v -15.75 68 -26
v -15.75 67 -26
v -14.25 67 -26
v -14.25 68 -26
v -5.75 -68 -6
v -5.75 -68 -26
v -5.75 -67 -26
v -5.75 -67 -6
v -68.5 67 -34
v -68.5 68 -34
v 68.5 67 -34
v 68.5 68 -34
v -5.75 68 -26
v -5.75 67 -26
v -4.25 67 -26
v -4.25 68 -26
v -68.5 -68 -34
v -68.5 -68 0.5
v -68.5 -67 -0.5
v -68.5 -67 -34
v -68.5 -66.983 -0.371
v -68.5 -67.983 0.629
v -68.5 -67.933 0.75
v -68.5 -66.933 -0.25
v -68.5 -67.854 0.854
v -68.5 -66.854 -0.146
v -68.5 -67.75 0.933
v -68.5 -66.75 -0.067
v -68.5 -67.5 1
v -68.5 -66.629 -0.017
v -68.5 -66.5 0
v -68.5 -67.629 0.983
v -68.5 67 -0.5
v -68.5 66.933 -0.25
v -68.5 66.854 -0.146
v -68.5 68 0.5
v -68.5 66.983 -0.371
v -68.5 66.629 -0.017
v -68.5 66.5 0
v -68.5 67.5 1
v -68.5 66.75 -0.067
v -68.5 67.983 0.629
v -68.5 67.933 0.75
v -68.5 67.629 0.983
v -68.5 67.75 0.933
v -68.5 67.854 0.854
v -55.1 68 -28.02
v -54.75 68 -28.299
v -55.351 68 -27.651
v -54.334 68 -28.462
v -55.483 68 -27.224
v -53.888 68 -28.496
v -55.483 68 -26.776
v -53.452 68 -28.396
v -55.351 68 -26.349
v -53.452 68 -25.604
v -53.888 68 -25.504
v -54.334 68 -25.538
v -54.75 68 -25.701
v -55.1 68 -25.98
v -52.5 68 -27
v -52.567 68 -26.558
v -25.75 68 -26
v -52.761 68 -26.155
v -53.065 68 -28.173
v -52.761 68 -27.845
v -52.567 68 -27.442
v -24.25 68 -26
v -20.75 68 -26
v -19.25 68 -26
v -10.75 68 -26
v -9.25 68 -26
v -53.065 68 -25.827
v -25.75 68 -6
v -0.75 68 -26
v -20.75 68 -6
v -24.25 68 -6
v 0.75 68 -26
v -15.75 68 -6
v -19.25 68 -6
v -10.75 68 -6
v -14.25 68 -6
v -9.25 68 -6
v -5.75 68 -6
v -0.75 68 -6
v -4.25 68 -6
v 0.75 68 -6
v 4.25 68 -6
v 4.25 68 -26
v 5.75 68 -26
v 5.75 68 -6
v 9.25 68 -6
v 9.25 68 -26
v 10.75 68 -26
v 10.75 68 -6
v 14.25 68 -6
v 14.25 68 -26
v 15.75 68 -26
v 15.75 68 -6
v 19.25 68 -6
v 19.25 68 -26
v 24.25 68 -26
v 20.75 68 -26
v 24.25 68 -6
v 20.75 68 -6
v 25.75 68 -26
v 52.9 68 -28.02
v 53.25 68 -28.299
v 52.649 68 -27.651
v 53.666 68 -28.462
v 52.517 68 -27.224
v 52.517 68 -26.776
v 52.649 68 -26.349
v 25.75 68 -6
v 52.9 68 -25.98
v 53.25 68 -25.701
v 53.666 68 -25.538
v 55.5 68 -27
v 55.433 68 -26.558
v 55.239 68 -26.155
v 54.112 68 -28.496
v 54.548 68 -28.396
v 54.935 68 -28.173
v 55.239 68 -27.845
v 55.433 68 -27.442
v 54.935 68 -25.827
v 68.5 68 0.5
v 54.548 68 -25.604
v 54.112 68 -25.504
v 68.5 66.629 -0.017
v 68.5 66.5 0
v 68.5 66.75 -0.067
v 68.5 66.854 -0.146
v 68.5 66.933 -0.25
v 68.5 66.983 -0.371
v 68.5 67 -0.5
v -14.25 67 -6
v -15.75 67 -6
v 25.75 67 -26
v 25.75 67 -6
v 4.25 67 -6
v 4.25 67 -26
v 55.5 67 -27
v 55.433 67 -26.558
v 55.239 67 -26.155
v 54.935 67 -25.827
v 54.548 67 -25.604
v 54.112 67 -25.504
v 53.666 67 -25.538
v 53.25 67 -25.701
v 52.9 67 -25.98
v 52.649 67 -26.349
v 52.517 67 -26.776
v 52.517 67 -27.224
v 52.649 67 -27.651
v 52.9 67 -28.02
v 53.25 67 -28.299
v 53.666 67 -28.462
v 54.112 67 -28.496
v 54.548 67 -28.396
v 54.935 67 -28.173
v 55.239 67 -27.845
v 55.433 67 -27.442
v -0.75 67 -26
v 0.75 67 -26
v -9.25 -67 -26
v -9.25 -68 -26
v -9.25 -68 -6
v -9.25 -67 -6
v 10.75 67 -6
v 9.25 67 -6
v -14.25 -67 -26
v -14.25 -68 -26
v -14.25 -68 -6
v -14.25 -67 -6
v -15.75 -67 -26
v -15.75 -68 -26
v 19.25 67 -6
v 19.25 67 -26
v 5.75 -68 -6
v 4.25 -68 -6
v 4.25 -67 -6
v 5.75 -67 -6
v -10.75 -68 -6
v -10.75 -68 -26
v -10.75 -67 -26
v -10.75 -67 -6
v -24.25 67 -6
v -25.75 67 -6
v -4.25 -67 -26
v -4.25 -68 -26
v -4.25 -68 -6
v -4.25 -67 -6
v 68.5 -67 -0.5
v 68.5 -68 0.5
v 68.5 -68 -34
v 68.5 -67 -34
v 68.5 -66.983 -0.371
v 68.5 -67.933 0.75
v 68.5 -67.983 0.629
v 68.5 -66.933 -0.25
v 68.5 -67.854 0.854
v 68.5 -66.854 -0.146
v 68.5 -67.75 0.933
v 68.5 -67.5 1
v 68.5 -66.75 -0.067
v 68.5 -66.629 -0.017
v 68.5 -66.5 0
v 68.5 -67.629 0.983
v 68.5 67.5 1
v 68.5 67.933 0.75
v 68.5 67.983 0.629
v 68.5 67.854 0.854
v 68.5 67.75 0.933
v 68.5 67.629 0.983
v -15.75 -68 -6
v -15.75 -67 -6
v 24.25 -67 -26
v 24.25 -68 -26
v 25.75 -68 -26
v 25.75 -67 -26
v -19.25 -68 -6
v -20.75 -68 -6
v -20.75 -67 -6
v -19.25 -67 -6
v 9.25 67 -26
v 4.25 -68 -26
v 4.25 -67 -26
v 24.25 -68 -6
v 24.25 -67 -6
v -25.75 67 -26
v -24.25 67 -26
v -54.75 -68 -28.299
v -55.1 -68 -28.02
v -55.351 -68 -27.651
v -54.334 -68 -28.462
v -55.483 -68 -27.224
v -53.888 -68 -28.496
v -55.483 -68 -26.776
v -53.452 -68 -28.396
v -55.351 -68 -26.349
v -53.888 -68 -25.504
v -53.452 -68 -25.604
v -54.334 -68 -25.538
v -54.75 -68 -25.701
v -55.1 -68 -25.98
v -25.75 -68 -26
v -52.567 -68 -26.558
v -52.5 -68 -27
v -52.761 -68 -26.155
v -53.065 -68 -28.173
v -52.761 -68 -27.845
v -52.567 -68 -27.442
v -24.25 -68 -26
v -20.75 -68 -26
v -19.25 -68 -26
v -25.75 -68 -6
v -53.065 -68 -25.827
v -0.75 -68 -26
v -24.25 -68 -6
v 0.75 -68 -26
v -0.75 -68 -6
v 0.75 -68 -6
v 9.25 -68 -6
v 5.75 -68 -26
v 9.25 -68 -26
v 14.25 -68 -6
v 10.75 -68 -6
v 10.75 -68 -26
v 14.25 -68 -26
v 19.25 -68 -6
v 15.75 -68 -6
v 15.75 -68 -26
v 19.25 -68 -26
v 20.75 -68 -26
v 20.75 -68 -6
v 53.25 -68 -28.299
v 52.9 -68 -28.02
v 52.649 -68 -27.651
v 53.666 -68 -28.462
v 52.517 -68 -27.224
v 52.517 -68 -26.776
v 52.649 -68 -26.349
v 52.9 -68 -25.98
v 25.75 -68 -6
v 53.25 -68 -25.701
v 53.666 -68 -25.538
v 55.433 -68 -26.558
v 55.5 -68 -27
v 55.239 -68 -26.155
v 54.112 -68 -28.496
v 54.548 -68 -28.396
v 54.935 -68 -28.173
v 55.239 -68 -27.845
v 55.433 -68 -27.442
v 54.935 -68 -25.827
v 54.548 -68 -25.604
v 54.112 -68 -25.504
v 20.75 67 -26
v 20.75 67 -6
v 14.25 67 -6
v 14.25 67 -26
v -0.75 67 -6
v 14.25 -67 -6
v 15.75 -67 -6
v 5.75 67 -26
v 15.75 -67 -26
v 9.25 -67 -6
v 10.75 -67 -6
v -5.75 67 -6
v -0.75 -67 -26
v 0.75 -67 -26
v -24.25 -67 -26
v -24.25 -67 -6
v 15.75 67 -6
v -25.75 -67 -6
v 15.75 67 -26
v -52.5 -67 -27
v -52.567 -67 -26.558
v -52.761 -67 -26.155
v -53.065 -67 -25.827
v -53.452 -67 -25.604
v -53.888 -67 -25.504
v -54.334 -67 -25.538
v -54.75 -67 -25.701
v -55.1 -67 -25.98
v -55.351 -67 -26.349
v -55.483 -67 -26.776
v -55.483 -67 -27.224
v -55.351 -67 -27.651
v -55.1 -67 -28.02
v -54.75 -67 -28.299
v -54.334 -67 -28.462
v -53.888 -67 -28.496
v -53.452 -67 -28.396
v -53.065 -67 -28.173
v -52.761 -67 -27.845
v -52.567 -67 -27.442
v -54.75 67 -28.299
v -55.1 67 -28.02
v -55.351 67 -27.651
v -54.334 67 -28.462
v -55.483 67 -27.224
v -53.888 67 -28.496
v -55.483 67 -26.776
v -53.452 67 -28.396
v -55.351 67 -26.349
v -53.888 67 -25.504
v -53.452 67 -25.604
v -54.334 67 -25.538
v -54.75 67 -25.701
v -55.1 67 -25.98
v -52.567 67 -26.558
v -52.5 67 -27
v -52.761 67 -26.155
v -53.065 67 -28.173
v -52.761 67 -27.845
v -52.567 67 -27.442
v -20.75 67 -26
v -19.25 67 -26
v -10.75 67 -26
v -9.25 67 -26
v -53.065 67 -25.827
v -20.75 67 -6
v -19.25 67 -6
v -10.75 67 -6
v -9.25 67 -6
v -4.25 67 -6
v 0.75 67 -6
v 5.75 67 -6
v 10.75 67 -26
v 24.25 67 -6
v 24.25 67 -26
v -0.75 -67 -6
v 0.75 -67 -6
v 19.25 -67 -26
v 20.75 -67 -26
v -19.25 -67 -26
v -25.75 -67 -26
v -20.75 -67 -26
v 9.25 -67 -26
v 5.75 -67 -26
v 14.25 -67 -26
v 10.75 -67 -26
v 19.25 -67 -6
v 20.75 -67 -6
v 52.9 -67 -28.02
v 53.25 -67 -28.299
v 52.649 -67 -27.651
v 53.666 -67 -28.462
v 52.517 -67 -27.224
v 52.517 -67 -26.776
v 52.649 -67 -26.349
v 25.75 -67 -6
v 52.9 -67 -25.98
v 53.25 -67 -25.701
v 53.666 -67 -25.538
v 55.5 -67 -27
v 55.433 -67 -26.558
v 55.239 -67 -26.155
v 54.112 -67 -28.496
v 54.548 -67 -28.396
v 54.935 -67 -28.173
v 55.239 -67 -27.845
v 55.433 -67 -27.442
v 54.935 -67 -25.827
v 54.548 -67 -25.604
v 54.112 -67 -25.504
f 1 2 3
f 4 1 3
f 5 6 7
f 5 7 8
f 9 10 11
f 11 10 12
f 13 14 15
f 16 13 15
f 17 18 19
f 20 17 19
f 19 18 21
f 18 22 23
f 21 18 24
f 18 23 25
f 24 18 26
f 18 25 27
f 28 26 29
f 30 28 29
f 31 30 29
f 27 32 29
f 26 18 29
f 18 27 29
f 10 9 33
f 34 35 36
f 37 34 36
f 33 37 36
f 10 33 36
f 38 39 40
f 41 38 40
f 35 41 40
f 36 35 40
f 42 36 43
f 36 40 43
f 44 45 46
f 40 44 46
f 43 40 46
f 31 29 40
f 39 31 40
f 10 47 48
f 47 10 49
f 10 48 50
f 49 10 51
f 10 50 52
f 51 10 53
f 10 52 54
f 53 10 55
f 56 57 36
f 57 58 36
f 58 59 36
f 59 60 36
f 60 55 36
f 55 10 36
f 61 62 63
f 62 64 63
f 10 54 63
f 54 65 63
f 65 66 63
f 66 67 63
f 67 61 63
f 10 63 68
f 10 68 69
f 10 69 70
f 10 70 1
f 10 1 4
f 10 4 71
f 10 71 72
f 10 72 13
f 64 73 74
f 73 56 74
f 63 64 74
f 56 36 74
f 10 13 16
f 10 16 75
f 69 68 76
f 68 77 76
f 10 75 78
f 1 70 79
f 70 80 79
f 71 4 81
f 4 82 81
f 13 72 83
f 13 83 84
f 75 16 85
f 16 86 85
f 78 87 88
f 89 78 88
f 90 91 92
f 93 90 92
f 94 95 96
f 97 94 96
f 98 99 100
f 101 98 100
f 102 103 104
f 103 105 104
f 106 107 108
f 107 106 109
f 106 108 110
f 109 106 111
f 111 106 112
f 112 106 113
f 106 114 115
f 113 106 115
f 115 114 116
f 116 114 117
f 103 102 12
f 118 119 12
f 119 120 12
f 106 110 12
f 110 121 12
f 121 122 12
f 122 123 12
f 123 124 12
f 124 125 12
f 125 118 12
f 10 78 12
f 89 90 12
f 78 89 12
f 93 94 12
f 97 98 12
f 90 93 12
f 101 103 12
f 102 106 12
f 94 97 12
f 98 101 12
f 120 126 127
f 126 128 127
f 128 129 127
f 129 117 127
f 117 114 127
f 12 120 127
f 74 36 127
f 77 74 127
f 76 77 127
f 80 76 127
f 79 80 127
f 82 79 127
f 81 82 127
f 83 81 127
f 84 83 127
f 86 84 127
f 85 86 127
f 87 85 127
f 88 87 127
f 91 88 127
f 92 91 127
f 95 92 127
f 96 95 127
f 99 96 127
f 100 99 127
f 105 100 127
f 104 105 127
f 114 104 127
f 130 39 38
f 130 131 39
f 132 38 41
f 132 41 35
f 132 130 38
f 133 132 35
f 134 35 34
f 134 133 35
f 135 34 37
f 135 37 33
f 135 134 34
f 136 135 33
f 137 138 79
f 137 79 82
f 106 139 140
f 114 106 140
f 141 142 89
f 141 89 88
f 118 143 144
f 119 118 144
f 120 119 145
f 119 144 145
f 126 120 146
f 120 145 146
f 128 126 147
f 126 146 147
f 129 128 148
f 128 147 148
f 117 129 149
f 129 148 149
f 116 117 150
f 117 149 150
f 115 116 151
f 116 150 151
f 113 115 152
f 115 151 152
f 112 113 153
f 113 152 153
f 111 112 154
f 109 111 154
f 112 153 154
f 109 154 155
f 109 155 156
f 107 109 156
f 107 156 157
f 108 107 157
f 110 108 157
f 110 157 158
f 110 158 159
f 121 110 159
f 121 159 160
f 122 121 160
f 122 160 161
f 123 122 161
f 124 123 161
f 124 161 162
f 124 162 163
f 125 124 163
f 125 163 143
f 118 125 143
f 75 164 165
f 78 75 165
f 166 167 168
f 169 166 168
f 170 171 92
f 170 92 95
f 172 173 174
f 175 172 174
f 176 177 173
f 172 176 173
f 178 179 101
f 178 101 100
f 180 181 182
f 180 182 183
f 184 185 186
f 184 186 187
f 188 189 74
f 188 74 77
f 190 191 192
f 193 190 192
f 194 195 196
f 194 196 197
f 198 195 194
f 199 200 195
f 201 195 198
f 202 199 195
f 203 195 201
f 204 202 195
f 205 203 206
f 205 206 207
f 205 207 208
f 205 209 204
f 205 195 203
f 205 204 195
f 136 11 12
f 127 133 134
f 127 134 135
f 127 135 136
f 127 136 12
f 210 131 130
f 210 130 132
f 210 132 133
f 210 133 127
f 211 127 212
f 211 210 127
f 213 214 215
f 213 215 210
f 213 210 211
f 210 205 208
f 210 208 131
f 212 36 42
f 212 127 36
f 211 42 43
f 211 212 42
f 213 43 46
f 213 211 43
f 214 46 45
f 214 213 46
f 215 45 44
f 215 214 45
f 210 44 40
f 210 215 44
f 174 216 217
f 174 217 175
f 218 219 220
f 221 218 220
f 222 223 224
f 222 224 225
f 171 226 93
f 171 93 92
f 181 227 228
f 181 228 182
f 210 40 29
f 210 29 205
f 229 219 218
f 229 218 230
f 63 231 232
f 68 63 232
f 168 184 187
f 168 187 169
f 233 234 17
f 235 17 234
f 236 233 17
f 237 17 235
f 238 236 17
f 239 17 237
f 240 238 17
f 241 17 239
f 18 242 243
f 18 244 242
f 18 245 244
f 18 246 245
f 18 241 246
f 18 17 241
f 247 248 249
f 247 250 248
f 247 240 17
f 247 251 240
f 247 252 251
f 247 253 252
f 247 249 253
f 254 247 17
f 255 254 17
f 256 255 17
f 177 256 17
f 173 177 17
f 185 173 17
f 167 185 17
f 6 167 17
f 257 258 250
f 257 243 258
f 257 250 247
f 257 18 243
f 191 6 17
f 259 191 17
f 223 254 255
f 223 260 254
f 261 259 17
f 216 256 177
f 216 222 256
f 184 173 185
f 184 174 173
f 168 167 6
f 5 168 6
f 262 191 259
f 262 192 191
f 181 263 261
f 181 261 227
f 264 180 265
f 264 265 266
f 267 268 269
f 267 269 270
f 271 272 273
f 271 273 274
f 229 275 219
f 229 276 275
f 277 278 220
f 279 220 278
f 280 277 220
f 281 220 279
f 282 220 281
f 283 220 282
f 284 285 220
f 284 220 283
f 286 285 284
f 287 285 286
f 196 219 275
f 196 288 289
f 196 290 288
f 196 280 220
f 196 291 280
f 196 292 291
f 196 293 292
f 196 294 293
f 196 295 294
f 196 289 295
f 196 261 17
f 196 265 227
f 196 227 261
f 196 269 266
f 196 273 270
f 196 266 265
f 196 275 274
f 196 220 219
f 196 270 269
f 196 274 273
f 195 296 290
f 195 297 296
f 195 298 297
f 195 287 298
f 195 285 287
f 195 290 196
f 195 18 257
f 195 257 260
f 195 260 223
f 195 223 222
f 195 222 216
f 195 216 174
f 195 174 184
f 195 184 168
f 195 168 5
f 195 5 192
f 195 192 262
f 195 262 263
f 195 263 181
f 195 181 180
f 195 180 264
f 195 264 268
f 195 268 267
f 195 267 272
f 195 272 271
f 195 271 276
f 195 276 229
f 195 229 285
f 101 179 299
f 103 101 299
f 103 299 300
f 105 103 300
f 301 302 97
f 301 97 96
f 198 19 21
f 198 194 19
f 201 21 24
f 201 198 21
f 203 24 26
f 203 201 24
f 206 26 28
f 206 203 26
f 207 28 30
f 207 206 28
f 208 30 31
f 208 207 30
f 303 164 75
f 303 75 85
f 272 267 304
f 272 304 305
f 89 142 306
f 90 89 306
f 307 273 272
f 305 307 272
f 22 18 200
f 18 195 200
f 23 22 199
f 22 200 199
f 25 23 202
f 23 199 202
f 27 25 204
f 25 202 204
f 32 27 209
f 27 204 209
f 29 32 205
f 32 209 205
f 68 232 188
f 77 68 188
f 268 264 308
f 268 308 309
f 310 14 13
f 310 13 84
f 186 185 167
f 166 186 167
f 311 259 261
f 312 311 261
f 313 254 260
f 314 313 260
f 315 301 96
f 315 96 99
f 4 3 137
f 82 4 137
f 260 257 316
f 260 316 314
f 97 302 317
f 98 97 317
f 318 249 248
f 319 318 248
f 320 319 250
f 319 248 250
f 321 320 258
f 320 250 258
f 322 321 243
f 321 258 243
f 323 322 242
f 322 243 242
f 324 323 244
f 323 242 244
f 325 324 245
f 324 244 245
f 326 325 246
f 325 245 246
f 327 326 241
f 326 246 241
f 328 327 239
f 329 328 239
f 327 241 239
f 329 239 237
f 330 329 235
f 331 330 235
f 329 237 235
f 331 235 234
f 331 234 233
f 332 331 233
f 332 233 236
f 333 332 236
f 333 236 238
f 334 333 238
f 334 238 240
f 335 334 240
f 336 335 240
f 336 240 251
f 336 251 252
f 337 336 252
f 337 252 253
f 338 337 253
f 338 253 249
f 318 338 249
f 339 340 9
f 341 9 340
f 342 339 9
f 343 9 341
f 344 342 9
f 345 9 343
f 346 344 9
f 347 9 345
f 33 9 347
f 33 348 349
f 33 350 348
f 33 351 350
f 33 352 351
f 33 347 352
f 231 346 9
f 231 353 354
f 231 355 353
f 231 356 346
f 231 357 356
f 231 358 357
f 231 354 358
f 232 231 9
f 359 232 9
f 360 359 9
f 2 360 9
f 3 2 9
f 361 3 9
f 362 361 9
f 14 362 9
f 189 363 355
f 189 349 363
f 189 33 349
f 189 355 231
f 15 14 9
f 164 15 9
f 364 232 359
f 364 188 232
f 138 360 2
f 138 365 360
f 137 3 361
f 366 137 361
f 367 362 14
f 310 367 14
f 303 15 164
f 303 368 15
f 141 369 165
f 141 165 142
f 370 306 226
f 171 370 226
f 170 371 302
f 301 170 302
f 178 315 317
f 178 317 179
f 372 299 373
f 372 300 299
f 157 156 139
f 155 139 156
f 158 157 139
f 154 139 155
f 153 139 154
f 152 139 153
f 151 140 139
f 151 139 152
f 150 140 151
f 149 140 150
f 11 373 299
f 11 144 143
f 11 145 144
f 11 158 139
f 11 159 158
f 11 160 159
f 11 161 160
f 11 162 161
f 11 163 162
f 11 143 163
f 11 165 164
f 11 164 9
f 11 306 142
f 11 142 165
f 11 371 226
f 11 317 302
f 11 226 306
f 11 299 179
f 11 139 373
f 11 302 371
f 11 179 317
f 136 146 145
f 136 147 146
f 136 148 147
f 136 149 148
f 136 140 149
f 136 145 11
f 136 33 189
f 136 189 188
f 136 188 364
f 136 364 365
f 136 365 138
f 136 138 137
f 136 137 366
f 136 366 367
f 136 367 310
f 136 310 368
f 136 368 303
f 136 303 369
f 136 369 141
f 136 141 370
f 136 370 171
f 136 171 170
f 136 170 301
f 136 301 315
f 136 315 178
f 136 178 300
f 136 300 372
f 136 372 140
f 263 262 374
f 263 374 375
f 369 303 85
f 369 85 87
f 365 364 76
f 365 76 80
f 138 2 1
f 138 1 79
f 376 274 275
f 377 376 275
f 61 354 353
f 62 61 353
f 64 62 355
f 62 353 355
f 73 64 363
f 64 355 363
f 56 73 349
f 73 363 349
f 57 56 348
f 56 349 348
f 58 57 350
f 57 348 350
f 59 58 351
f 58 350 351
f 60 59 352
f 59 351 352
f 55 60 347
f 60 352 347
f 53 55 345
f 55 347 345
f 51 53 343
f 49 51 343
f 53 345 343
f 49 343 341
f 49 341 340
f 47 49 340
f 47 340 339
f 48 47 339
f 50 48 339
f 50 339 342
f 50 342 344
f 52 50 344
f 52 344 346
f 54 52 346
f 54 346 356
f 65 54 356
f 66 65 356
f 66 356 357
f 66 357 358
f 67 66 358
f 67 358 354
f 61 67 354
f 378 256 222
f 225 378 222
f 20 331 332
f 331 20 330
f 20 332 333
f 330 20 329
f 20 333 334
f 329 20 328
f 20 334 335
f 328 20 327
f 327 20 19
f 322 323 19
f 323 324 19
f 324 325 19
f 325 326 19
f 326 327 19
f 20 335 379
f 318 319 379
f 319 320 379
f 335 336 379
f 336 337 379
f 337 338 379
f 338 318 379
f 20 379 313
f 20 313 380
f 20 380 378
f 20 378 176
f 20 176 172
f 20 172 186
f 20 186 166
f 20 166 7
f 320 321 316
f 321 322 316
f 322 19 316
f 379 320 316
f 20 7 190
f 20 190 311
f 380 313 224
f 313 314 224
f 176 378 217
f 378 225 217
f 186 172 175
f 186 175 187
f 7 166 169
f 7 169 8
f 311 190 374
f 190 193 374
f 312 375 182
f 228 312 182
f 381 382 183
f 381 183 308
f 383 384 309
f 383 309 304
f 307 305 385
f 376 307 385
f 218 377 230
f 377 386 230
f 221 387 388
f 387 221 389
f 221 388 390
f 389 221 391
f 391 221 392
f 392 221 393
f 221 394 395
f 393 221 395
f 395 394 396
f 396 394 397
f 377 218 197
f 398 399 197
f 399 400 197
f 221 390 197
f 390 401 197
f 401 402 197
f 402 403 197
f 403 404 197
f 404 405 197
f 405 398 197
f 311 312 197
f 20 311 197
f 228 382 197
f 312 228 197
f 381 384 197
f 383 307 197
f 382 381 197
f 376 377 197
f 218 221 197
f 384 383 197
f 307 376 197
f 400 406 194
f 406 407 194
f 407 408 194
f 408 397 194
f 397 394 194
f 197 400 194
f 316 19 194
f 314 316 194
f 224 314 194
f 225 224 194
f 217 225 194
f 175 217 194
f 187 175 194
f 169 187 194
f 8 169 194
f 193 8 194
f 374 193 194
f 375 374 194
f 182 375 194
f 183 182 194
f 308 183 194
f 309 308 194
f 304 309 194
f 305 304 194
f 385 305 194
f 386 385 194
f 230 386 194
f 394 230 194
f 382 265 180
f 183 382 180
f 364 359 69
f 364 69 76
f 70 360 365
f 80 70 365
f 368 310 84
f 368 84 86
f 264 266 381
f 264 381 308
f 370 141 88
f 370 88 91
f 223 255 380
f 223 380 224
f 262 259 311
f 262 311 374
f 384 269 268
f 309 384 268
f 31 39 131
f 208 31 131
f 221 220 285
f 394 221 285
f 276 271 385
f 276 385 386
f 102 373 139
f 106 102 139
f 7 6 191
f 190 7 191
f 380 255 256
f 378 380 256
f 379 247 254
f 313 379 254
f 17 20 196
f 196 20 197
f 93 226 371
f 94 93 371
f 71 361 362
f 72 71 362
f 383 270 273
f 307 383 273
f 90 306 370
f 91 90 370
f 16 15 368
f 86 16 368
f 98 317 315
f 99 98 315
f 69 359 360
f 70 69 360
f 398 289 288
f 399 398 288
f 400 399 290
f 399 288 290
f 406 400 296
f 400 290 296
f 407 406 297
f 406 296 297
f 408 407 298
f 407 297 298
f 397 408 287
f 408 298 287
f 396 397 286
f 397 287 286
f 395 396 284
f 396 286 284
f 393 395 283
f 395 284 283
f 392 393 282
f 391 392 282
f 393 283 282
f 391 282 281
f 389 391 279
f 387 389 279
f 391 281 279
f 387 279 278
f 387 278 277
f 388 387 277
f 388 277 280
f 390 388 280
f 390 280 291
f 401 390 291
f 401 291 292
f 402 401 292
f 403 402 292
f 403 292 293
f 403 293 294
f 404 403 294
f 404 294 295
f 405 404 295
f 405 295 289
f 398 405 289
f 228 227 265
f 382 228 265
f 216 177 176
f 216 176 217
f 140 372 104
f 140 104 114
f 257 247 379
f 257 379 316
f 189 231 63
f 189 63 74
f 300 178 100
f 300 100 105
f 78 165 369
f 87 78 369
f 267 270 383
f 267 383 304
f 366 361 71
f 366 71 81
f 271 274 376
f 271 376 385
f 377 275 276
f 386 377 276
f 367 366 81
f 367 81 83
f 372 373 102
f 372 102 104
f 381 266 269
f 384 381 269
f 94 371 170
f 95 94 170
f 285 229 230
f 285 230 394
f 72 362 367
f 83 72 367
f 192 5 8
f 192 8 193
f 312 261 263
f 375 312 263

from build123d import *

# Parameters (mm, degrees)
F0_W     = 137
F0_H     = 134
F1_DEPTH = 1
F2_W     = 137
F2_H     = 1
F3_DEPTH = 35
F4_R     = 1.5
F4_W     = 1.5
F4_H     = 20
F5_DEPTH = 136.001
F6_R     = 0.5


with BuildPart() as f1:
    # F0 (on Top) → F1 (new body)
    with BuildSketch(Plane.XY):
        Rectangle(F0_W, F0_H)
    extrude(amount=F1_DEPTH)

    # F2 (on face) → F3 (join)
    with BuildSketch(Plane.XY.offset(1)):
        with Locations((0, -67.5)):
            Rectangle(F2_W, F2_H)
        with Locations((0, 67.5)):
            Rectangle(F2_W, F2_H)
    extrude(amount=-F3_DEPTH)

    # F4 (on face) → F5 (cut, through all)
    with BuildSketch(Plane.XZ.offset(68)):
        with Locations((-54, -27)):
            Circle(F4_R)
        with Locations((54, -27)):
            Circle(F4_R)
        with Locations((-25, -16)):
            Rectangle(F4_W, F4_H)
        with Locations((-20, -16)):
            Rectangle(F4_W, F4_H)
        with Locations((-15, -16)):
            Rectangle(F4_W, F4_H)
        with Locations((-10, -16)):
            Rectangle(F4_W, F4_H)
        with Locations((-5, -16)):
            Rectangle(F4_W, F4_H)
        with Locations((0, -16)):
            Rectangle(F4_W, F4_H)
        with Locations((5, -16)):
            Rectangle(F4_W, F4_H)
        with Locations((10, -16)):
            Rectangle(F4_W, F4_H)
        with Locations((15, -16)):
            Rectangle(F4_W, F4_H)
        with Locations((20, -16)):
            Rectangle(F4_W, F4_H)
        with Locations((25, -16)):
            Rectangle(F4_W, F4_H)
    extrude(amount=-F5_DEPTH, mode=Mode.SUBTRACT)

    # F6
    f6_edges = [f1.edges().sort_by_distance(p)[0] for p in [
        (0, -68, 1),
        (0, 68, 1),
        (0, -67, 0),
        (0, 67, 0),
    ]]
    fillet(f6_edges, radius=F6_R)


solid = f1.part
